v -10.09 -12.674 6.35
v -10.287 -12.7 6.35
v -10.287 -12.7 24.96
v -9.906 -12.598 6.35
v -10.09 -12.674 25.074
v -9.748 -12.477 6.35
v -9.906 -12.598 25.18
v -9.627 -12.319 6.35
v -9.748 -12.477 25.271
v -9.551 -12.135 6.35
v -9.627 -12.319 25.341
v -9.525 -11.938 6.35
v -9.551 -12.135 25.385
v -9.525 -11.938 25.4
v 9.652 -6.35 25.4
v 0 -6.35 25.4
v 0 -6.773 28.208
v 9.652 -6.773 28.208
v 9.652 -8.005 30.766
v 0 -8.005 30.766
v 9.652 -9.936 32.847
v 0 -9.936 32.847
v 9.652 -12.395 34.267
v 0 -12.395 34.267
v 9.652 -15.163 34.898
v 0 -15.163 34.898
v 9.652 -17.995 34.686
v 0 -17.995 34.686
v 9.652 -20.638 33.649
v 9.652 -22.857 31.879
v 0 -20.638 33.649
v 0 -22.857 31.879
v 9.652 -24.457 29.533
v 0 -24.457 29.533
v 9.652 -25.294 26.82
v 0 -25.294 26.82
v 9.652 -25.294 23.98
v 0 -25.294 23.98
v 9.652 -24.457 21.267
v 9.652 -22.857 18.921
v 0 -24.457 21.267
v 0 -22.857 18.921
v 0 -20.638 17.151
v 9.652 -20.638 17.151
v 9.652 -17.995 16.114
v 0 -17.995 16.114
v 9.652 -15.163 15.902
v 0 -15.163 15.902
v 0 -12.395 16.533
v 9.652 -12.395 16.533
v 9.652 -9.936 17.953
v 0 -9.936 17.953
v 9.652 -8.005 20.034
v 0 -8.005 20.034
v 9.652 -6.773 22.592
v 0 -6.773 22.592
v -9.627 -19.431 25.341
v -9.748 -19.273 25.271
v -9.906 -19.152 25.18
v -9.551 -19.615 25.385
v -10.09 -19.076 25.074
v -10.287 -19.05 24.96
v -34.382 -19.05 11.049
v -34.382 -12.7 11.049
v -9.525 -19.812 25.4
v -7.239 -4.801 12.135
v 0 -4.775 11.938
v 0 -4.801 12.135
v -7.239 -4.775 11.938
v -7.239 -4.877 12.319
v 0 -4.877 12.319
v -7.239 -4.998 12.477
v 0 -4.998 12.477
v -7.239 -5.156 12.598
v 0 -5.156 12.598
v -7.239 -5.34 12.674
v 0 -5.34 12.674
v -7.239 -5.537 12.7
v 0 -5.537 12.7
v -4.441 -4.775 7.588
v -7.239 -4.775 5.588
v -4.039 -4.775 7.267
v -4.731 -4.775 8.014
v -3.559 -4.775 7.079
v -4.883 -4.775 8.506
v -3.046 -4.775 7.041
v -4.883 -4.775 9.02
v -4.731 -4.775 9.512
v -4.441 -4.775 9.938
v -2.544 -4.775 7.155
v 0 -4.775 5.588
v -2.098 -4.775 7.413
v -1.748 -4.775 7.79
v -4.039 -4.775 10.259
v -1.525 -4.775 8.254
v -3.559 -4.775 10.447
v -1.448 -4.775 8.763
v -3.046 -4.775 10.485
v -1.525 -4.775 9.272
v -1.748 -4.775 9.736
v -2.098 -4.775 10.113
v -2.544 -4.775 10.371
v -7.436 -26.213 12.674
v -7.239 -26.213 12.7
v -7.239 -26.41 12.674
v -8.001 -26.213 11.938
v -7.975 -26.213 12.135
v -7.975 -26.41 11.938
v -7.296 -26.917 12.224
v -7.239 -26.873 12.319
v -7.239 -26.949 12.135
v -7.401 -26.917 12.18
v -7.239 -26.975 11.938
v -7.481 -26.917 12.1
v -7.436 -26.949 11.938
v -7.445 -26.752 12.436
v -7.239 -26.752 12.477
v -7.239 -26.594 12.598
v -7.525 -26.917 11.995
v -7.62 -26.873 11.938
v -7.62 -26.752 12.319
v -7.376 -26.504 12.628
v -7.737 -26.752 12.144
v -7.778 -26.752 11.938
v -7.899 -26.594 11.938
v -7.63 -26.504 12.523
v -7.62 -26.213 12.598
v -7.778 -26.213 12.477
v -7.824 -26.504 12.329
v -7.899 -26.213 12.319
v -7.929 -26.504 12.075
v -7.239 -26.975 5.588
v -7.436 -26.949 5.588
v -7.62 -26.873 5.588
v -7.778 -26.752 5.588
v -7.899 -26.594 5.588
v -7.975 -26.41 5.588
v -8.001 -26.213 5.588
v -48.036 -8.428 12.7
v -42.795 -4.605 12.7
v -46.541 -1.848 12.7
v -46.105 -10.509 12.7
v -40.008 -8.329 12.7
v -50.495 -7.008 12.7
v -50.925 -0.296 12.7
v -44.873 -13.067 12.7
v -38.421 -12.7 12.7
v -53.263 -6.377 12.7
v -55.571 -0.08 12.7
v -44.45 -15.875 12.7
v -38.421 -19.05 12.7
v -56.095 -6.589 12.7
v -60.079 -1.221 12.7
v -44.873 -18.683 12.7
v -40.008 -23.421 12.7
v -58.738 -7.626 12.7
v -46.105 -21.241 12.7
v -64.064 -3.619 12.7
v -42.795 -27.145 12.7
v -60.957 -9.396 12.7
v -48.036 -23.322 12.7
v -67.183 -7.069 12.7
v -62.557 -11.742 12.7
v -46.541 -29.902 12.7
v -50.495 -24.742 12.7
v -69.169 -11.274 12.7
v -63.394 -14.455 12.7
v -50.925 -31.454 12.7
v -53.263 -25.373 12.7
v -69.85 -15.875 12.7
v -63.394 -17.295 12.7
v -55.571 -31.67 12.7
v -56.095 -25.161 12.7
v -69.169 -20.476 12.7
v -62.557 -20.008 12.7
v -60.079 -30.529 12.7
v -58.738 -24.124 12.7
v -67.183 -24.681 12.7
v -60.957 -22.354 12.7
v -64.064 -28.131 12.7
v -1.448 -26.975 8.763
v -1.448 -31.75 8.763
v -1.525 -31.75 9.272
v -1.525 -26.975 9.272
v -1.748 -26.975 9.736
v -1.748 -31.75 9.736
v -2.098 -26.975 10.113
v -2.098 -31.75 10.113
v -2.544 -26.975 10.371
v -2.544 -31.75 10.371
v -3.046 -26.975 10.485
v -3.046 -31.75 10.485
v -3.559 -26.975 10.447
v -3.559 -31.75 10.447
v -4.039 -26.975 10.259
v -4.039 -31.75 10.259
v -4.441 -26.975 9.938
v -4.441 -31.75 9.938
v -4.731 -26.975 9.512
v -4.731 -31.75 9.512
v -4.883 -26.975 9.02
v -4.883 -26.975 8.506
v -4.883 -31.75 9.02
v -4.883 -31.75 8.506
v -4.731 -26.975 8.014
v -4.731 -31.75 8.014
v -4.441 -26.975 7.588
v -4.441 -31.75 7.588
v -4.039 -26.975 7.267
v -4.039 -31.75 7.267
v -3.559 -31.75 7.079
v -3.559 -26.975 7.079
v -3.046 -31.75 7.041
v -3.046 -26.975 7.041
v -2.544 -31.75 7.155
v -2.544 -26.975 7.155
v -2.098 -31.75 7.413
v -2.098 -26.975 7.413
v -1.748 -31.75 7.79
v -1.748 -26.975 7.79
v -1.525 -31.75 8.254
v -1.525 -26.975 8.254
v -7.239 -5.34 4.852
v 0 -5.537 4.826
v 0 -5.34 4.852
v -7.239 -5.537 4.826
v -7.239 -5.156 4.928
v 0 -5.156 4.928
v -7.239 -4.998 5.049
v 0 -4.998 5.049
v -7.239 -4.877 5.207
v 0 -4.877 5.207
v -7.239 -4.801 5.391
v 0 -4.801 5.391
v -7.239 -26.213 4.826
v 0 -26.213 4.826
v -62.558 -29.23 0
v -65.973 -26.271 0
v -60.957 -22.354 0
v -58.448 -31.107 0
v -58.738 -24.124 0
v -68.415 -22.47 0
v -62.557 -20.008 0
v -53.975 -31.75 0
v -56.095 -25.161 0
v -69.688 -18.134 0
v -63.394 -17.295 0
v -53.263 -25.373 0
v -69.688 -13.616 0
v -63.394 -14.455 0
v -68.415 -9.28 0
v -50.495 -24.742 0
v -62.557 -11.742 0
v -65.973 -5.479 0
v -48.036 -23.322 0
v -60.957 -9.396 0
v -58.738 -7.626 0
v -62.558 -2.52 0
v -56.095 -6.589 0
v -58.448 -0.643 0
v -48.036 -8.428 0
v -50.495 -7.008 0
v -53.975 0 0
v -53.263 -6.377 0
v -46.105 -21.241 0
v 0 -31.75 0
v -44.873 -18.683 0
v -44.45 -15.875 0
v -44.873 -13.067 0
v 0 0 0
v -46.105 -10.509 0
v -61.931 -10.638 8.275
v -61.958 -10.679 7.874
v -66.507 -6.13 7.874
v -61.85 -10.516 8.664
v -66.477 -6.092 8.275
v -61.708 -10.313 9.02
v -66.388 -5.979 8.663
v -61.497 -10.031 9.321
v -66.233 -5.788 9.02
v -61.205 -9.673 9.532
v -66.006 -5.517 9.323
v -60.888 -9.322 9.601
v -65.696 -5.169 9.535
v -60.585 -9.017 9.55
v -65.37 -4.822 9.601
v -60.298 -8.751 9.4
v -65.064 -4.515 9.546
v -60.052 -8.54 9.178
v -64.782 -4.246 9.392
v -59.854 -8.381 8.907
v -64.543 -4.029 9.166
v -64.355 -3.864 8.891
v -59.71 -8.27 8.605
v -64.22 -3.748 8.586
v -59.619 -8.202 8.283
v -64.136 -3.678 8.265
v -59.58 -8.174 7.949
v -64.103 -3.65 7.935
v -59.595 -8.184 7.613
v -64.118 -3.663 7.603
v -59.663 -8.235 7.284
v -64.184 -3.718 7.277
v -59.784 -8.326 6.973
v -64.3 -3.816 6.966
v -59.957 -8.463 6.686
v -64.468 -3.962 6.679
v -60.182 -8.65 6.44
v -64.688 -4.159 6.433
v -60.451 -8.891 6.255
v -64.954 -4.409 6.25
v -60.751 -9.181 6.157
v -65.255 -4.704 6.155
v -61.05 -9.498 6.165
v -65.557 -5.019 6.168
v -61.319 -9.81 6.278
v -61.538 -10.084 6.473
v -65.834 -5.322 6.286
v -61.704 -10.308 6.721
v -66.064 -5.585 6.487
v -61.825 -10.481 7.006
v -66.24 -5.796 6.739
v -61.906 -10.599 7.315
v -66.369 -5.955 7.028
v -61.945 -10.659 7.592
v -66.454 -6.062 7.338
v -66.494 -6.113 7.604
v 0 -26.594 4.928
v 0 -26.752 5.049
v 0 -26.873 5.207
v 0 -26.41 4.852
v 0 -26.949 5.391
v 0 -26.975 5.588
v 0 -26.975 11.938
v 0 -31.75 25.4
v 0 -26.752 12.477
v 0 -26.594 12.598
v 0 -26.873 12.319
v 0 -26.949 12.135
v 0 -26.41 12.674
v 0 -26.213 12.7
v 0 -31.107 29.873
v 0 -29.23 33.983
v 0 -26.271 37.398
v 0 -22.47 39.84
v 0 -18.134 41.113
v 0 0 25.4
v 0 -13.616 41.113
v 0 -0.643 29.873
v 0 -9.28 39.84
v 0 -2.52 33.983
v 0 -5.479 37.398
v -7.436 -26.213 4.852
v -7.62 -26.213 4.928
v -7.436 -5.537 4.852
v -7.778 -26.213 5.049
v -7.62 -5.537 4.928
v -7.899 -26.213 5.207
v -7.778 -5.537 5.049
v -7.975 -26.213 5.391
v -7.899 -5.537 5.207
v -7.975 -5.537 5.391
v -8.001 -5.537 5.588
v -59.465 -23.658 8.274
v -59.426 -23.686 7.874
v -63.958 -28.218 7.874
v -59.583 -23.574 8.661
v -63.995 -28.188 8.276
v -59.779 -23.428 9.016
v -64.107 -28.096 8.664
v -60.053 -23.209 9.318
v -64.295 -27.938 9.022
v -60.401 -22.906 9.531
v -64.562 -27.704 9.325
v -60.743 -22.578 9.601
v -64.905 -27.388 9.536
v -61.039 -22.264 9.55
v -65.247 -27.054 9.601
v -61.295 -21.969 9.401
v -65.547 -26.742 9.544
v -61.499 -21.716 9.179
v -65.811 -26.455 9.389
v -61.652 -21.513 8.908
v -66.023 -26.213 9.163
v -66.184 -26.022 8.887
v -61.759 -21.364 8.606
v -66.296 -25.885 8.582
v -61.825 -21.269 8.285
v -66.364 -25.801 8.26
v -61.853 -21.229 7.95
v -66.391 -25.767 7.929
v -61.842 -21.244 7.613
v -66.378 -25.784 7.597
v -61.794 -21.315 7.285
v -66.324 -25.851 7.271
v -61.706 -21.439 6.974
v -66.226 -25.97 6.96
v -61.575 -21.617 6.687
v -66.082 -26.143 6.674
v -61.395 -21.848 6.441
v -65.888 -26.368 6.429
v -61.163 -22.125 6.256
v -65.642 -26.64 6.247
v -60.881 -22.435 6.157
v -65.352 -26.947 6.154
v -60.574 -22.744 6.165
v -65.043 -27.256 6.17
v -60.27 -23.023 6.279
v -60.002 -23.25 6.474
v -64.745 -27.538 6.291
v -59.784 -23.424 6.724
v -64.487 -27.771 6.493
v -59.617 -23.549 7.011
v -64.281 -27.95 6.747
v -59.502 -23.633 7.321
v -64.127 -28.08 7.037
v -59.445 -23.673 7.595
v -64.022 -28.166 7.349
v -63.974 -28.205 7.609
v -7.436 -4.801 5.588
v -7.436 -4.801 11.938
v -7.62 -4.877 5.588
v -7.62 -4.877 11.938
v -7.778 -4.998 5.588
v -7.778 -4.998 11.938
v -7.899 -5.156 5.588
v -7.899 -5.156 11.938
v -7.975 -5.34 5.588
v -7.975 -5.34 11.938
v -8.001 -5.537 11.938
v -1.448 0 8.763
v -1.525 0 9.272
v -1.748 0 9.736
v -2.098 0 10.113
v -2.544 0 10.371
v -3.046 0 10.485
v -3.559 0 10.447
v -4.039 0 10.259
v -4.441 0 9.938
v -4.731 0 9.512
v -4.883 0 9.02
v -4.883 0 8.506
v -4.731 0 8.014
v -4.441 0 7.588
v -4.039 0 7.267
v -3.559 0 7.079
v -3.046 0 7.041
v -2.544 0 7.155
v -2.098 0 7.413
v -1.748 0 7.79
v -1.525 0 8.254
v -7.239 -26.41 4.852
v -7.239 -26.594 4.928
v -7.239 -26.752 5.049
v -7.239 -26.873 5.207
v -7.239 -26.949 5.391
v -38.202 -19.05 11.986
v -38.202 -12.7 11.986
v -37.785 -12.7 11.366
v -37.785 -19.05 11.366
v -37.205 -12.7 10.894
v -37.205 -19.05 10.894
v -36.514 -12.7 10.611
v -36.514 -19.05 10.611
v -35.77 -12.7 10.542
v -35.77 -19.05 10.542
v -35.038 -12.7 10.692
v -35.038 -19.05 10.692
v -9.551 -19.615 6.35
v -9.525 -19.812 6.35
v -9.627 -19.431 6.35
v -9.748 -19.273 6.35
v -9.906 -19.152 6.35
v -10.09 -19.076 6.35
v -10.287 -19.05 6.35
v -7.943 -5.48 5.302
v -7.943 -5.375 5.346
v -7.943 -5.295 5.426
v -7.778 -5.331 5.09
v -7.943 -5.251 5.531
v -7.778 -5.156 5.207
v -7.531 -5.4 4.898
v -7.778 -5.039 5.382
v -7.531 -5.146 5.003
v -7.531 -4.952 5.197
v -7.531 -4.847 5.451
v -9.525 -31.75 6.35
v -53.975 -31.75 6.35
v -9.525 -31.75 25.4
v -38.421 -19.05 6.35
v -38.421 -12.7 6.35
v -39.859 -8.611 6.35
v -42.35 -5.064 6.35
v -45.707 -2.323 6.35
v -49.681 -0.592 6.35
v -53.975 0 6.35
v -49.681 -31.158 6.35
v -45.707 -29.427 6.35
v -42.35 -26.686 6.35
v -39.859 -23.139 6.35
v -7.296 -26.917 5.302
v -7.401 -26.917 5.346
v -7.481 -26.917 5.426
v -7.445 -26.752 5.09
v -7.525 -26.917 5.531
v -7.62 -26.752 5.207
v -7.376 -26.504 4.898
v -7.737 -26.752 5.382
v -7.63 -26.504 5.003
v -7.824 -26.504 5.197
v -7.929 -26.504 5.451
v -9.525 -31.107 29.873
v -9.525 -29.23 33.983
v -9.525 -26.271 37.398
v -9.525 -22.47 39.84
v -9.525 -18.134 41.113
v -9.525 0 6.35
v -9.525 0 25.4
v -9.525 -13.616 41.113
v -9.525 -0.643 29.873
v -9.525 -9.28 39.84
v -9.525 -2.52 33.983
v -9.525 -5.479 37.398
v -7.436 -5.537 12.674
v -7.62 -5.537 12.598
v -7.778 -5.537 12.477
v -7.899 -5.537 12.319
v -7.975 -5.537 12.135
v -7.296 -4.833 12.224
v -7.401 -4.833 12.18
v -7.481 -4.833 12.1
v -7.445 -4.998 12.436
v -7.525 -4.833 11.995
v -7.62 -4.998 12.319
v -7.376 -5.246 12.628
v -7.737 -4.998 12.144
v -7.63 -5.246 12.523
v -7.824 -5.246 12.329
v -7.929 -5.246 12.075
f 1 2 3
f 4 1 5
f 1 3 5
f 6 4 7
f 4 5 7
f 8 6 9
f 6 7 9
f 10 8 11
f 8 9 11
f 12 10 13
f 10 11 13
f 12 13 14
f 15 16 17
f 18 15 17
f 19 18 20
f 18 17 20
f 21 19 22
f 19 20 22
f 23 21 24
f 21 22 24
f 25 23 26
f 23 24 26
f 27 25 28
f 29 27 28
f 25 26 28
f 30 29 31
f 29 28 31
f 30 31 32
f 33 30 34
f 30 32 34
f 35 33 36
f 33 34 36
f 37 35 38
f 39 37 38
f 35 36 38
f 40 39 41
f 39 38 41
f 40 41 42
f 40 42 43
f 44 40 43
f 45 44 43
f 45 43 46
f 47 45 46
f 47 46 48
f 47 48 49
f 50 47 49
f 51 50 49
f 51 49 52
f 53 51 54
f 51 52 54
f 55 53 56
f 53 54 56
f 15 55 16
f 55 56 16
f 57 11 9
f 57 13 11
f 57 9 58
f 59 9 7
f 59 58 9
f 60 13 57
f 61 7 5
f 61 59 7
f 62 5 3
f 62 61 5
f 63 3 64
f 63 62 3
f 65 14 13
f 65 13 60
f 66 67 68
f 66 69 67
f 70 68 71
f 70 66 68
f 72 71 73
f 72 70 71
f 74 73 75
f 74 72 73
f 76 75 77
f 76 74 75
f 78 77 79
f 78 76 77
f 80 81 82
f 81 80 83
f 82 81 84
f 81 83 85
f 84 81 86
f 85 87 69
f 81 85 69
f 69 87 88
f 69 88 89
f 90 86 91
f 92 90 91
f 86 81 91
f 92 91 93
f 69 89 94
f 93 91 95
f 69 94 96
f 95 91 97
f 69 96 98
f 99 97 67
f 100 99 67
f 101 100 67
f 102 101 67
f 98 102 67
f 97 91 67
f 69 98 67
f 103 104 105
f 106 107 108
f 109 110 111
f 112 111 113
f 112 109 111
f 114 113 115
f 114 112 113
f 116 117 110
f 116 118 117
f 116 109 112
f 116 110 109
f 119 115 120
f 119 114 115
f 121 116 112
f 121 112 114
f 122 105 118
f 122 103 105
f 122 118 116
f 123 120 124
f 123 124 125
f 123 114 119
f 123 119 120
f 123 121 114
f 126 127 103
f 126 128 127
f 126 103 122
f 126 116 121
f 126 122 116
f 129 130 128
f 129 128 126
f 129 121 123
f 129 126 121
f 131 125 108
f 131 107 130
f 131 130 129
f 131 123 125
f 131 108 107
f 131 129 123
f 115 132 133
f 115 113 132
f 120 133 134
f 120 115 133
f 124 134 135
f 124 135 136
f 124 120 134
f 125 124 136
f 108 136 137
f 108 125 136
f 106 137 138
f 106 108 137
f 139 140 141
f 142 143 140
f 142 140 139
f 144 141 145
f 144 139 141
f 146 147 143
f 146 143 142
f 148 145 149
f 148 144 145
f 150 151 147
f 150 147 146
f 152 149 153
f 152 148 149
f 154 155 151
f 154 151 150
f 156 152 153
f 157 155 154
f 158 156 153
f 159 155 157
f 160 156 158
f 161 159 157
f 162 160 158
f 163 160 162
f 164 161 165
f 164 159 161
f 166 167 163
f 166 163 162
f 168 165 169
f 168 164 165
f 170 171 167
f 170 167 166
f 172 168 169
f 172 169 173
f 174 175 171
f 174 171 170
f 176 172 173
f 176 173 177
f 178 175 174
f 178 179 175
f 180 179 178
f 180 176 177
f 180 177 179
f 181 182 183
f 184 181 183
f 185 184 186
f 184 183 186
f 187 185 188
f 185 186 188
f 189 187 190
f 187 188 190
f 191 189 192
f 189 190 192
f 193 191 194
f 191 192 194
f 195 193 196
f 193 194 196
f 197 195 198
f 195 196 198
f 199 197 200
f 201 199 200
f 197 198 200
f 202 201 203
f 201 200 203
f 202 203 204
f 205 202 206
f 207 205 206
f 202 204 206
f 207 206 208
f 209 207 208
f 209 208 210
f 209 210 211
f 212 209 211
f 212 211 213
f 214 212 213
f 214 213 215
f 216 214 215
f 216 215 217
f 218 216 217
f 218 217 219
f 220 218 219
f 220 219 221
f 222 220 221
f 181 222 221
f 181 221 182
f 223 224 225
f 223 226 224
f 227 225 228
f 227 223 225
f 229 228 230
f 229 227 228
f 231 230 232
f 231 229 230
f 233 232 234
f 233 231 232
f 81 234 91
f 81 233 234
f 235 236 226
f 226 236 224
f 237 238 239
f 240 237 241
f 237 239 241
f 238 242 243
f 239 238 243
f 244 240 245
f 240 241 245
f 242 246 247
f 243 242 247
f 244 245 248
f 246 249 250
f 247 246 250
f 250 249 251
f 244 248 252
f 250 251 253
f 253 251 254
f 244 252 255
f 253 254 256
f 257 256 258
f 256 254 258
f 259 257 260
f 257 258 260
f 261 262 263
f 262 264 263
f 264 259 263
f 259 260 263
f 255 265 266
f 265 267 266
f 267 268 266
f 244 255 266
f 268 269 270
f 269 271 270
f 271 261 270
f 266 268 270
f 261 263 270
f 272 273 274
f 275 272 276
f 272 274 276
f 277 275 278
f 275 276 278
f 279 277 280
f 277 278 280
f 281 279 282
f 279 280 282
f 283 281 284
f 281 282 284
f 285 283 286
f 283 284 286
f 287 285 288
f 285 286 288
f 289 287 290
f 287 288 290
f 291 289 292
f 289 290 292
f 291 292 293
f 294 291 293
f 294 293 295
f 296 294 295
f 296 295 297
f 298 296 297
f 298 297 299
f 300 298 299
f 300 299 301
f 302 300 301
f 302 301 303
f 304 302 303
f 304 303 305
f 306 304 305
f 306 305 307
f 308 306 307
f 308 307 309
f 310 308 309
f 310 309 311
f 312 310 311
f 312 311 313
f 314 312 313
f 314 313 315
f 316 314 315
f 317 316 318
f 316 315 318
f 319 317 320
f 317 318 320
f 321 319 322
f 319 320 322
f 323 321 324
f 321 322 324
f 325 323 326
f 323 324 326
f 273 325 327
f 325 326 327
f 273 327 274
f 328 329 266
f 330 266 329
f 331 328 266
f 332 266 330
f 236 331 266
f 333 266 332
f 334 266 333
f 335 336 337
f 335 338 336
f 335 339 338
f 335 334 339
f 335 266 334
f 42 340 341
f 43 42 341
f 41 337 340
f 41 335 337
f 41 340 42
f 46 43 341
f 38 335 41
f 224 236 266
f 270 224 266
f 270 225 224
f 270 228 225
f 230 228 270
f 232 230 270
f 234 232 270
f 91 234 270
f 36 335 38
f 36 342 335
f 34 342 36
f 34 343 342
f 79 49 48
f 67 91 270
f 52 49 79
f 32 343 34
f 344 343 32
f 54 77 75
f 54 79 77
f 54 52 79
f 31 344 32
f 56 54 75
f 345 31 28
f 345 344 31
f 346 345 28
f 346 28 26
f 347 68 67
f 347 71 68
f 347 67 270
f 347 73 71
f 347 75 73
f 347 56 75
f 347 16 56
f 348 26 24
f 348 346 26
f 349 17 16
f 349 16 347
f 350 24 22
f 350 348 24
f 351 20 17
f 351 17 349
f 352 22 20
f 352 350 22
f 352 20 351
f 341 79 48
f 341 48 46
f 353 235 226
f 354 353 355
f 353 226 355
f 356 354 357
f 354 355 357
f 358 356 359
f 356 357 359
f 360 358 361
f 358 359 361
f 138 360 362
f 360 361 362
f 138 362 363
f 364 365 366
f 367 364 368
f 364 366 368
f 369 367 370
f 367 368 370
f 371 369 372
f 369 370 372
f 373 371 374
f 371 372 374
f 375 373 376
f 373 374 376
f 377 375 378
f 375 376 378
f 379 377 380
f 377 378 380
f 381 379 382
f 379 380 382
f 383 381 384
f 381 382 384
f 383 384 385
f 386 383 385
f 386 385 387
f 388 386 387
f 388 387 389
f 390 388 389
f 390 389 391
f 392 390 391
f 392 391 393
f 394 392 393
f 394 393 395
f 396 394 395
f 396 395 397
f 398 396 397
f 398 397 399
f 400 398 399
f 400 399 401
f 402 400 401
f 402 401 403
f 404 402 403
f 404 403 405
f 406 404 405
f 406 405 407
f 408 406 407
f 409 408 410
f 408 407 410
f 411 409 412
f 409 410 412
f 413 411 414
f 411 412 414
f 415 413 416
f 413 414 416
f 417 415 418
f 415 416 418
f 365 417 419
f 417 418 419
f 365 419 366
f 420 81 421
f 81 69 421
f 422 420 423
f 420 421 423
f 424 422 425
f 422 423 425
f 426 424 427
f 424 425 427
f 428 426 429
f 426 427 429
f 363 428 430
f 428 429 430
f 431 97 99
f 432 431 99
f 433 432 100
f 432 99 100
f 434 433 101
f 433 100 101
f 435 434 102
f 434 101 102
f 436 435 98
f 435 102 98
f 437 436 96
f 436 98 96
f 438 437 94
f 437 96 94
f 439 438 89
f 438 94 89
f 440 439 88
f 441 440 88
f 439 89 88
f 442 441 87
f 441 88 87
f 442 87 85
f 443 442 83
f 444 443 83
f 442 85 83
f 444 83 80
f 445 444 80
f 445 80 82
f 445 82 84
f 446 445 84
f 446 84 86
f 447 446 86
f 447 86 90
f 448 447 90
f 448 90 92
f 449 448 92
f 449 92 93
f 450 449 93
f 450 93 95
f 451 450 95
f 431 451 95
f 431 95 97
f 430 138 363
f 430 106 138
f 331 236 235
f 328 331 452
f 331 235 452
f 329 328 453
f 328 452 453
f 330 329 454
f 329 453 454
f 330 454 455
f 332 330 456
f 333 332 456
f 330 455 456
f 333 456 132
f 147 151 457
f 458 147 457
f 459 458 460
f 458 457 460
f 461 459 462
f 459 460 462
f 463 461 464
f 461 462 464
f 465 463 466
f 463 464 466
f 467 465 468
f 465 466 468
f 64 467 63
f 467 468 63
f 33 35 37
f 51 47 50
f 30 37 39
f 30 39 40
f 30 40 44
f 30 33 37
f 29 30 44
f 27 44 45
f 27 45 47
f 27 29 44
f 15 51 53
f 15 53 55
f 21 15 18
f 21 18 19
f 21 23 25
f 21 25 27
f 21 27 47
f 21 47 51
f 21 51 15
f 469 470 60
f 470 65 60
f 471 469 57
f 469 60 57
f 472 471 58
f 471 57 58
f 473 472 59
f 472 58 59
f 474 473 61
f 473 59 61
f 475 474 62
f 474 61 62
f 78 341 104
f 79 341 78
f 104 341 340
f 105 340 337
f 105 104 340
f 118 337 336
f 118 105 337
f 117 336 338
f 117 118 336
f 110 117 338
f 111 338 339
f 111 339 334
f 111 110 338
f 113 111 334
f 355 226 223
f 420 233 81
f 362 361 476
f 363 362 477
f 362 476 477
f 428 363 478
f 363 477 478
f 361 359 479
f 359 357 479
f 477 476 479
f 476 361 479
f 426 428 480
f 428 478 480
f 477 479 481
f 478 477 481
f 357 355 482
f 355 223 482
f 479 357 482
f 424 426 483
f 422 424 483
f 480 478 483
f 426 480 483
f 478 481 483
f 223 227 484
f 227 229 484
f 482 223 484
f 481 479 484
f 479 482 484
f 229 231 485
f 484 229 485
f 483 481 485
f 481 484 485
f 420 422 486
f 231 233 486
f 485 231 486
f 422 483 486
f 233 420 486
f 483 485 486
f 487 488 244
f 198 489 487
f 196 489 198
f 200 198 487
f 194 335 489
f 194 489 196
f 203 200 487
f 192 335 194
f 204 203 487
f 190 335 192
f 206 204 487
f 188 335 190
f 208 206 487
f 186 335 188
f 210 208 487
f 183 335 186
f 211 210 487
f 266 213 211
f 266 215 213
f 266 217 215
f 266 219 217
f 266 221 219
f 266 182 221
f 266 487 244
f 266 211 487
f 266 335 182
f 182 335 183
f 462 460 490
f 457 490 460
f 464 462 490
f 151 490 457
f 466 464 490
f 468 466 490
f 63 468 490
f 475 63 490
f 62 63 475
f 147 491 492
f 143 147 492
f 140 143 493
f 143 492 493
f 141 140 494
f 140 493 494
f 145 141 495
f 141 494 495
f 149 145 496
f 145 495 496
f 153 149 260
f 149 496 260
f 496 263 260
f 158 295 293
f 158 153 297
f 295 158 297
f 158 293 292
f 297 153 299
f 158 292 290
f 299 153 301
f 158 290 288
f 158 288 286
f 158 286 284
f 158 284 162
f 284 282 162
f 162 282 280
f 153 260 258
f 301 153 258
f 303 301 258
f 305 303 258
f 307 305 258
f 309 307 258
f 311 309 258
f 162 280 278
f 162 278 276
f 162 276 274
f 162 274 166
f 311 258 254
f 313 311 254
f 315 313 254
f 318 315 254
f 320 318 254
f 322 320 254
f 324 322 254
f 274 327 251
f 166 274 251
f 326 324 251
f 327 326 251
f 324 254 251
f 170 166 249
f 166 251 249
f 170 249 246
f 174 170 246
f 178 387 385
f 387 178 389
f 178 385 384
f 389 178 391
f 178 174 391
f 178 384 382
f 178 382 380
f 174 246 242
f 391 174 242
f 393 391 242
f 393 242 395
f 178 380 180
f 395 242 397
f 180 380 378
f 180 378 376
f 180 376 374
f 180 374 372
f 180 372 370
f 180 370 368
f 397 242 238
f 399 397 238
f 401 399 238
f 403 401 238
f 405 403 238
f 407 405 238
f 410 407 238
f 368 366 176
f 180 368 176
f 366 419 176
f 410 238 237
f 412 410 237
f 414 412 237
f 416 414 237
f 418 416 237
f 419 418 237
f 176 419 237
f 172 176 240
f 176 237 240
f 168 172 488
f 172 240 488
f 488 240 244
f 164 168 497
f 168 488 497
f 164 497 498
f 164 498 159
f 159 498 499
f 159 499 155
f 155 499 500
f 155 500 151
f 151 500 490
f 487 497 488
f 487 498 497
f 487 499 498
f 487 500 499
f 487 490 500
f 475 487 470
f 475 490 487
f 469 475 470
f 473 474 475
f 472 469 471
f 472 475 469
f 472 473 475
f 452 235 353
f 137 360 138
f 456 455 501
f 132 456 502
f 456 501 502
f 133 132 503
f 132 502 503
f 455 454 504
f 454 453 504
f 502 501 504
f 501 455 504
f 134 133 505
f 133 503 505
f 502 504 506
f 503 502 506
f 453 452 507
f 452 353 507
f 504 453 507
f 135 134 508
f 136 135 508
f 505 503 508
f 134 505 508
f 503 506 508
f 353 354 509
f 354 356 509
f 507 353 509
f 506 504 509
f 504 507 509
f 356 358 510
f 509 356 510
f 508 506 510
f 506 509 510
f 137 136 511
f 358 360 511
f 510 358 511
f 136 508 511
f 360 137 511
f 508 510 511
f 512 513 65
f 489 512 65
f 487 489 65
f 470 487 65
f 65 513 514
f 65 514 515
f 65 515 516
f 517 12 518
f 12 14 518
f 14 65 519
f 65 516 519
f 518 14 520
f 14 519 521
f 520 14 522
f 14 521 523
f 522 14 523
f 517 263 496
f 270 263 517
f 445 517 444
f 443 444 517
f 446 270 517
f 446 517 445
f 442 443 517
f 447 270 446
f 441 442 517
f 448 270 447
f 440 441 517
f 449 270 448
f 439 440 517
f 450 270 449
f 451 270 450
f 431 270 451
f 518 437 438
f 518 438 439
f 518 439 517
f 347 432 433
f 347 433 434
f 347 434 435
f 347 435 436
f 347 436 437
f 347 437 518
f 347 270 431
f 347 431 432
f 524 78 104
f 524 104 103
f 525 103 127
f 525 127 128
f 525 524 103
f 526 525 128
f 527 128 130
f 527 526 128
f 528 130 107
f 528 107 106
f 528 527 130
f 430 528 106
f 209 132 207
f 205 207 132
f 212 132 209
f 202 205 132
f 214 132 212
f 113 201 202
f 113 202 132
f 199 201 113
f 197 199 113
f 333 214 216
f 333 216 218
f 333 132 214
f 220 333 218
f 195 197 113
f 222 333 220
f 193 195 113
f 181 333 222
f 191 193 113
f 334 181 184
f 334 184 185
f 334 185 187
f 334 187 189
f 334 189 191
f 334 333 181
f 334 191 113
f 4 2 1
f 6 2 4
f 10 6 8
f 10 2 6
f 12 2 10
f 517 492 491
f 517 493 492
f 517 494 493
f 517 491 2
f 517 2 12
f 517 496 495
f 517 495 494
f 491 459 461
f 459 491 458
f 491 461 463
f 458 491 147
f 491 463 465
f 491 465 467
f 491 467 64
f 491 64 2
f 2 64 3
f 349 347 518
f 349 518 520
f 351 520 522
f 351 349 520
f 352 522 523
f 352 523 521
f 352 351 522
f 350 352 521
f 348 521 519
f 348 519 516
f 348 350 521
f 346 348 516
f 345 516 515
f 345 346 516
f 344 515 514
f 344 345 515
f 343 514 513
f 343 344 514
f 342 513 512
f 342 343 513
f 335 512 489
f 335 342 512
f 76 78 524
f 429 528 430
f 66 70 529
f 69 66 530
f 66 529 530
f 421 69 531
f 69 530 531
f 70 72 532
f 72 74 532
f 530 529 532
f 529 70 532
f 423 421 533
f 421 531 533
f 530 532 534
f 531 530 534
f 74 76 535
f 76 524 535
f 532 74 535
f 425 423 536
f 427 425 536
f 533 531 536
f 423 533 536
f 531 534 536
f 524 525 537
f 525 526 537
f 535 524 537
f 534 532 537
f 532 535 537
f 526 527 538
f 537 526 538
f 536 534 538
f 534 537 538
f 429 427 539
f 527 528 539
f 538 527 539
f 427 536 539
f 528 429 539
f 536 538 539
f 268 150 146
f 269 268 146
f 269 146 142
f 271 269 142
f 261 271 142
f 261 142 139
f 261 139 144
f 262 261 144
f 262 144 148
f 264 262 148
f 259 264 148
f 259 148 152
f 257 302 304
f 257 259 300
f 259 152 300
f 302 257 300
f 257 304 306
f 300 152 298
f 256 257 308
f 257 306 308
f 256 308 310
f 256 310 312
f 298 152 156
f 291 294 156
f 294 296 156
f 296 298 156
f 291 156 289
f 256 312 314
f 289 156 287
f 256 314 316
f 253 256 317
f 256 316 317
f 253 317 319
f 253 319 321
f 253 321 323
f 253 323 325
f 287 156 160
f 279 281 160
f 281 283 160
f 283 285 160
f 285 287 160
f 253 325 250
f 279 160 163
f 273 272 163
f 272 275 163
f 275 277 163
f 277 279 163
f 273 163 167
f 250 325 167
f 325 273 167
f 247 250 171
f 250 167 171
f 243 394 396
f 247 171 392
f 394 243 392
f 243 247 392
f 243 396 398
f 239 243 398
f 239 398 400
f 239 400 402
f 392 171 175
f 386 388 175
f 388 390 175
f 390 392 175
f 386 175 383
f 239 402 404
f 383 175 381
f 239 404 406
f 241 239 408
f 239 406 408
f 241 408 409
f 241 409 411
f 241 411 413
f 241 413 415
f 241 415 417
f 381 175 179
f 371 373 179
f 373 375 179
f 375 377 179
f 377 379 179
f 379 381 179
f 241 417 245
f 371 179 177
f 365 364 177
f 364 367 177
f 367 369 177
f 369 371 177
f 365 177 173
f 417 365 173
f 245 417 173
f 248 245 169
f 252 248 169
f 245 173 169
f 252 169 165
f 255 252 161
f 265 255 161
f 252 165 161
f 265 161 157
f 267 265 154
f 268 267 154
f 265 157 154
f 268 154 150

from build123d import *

# Parameters (mm, degrees)
F0_W          = 53.975
F0_H          = 31.75
F1_DEPTH      = 6.35
F2_R          = 15.875
F3_DEPTH      = 6.35
F3_DEPTH_BACK = 6.35
F4_R          = 9.525
F5_DEPTH      = 25.4
F6_W          = 31.75
F6_H          = 6.35
F6_R          = 9.525
F7_DEPTH      = 9.525
F8_R          = 9.525
F9_DEPTH      = 9.652
F9_DEPTH_BACK = 9.525
F12_DEPTH     = 3.175
F13_R         = 2.54
F14_DEPTH     = 19.051
F15_R         = 1.7272
F16_DEPTH     = 31.751
F17_W         = 22.1996
F17_H         = 7.874
F18_DEPTH     = 8.001
F19_R         = 0.762
F24_R         = 1.7272
F25_DEPTH     = 12.7
F27_R         = 1.7272
F28_DEPTH     = 12.7


with BuildPart() as f1:
    # F0 (on Top) → F1 (new body)
    with BuildSketch(Plane.XY):
        with Locations((-26.9875, -15.875)):
            Rectangle(F0_W, F0_H)
    extrude(amount=F1_DEPTH)

    # F2 (on face) → F3 (join, two sides)
    with BuildSketch(Plane.XY.offset(6.35)) as f3_sk:
        with Locations((-53.975, -15.875)):
            Circle(F2_R)
    extrude(amount=F3_DEPTH)
    extrude(f3_sk.sketch, amount=-F3_DEPTH_BACK)

    # F4 (on face) → F5 (cut)
    with BuildSketch(Plane.XY.offset(12.7)):
        with Locations((-53.975, -15.875)):
            Circle(F4_R)
    extrude(amount=-F5_DEPTH, mode=Mode.SUBTRACT)

    # F6 (on face) → F7 (join)
    with BuildSketch(Plane.YZ):
        with BuildLine():
            Line((0, 6.35), (0, 25.4))
            ThreePointArc((0, 25.4), (-15.875, 9.525), (-31.75, 25.4))
            Line((-31.75, 25.4), (-31.75, 6.35))
            Line((-31.75, 6.35), (0, 6.35))
        make_face()
        with Locations((-15.875, 3.175)):
            Rectangle(F6_W, F6_H)
        with BuildLine():
            ThreePointArc((-31.75, 25.4), (-15.875, 9.525), (0, 25.4))
            ThreePointArc((0, 25.4), (-15.875, 41.275), (-31.75, 25.4))
        make_face()
        with Locations((-15.875, 25.4)):
            Circle(F6_R, mode=Mode.SUBTRACT)
    extrude(amount=-F7_DEPTH)

    # F8 (on face) → F9 (join, two sides)
    with BuildSketch(Plane.YZ) as f9_sk:
        with Locations((-15.875, 25.4)):
            Circle(F8_R)
    extrude(amount=F9_DEPTH)
    extrude(f9_sk.sketch, amount=-F9_DEPTH_BACK)

    # F11 (on offset) → F12 (join, symmetric)
    with BuildSketch(Plane.XZ.offset(15.875)):
        Polygon((-9.525, 6.35), (-9.525, 25.4), (-34.3816611394, 11.049), (-34.3816611394, 12.7), (-38.9536611394, 12.7), (-38.9536611394, 6.35), align=None)
    extrude(amount=F12_DEPTH, both=True)

    # F13 (on face) → F14 (cut, through all)
    with BuildSketch(Plane.XZ.offset(19.05)):
        with Locations((-35.9090883884, 13.0784250415)):
            Circle(F13_R)
    extrude(amount=-F14_DEPTH, mode=Mode.SUBTRACT)

    # F15 (on face) → F16 (cut, through all)
    with BuildSketch(Plane.XZ.offset(31.75)):
        with Locations((-3.175, 8.763)):
            Circle(F15_R)
    extrude(amount=-F16_DEPTH, mode=Mode.SUBTRACT)

    # F17 (on face) → F18 (cut)
    with BuildSketch(Plane.YZ):
        with Locations((-15.875, 8.763)):
            Rectangle(F17_W, F17_H)
    extrude(amount=-F18_DEPTH, mode=Mode.SUBTRACT)

    # F19
    f19_edges = [f1.edges().sort_by_distance(p)[0] for p in [
        (-4.0005, -4.7752, 4.826),
        (-8.001, -15.875, 4.826),
        (-4.0005, -26.9748, 4.826),
        (-8.001, -15.875, 12.7),
        (-4.0005, -4.7752, 12.7),
        (-4.0005, -26.9748, 12.7),
        (-8.001, -26.9748, 8.763),
        (-8.001, -4.7752, 8.763),
        (-9.525, -19.05, 15.875),
        (-9.525, -12.7, 15.875),
    ]]
    fillet(f19_edges, radius=F19_R)

    # F24 (on offset) → F25 (cut)
    with BuildSketch(Plane(origin=(-47.3526280605, -47.3526280605, 0), x_dir=(0.7071067812, -0.7071067812, 0), z_dir=(-0.7071067812, -0.7071067812, 0))):
        with Locations((-26.9995890558, 7.874)):
            Circle(F24_R)
    extrude(amount=-F25_DEPTH, mode=Mode.SUBTRACT)

    # F27 (on offset) → F28 (cut)
    with BuildSketch(Plane(origin=(-31.4692606164, 31.4692606164, 0), x_dir=(-0.7071067812, -0.7071067812, 0), z_dir=(-0.7071067812, 0.7071067812, 0))):
        with Locations((49.6344417334, 7.874)):
            Circle(F27_R)
    extrude(amount=-F28_DEPTH, mode=Mode.SUBTRACT)


solid = f1.part
